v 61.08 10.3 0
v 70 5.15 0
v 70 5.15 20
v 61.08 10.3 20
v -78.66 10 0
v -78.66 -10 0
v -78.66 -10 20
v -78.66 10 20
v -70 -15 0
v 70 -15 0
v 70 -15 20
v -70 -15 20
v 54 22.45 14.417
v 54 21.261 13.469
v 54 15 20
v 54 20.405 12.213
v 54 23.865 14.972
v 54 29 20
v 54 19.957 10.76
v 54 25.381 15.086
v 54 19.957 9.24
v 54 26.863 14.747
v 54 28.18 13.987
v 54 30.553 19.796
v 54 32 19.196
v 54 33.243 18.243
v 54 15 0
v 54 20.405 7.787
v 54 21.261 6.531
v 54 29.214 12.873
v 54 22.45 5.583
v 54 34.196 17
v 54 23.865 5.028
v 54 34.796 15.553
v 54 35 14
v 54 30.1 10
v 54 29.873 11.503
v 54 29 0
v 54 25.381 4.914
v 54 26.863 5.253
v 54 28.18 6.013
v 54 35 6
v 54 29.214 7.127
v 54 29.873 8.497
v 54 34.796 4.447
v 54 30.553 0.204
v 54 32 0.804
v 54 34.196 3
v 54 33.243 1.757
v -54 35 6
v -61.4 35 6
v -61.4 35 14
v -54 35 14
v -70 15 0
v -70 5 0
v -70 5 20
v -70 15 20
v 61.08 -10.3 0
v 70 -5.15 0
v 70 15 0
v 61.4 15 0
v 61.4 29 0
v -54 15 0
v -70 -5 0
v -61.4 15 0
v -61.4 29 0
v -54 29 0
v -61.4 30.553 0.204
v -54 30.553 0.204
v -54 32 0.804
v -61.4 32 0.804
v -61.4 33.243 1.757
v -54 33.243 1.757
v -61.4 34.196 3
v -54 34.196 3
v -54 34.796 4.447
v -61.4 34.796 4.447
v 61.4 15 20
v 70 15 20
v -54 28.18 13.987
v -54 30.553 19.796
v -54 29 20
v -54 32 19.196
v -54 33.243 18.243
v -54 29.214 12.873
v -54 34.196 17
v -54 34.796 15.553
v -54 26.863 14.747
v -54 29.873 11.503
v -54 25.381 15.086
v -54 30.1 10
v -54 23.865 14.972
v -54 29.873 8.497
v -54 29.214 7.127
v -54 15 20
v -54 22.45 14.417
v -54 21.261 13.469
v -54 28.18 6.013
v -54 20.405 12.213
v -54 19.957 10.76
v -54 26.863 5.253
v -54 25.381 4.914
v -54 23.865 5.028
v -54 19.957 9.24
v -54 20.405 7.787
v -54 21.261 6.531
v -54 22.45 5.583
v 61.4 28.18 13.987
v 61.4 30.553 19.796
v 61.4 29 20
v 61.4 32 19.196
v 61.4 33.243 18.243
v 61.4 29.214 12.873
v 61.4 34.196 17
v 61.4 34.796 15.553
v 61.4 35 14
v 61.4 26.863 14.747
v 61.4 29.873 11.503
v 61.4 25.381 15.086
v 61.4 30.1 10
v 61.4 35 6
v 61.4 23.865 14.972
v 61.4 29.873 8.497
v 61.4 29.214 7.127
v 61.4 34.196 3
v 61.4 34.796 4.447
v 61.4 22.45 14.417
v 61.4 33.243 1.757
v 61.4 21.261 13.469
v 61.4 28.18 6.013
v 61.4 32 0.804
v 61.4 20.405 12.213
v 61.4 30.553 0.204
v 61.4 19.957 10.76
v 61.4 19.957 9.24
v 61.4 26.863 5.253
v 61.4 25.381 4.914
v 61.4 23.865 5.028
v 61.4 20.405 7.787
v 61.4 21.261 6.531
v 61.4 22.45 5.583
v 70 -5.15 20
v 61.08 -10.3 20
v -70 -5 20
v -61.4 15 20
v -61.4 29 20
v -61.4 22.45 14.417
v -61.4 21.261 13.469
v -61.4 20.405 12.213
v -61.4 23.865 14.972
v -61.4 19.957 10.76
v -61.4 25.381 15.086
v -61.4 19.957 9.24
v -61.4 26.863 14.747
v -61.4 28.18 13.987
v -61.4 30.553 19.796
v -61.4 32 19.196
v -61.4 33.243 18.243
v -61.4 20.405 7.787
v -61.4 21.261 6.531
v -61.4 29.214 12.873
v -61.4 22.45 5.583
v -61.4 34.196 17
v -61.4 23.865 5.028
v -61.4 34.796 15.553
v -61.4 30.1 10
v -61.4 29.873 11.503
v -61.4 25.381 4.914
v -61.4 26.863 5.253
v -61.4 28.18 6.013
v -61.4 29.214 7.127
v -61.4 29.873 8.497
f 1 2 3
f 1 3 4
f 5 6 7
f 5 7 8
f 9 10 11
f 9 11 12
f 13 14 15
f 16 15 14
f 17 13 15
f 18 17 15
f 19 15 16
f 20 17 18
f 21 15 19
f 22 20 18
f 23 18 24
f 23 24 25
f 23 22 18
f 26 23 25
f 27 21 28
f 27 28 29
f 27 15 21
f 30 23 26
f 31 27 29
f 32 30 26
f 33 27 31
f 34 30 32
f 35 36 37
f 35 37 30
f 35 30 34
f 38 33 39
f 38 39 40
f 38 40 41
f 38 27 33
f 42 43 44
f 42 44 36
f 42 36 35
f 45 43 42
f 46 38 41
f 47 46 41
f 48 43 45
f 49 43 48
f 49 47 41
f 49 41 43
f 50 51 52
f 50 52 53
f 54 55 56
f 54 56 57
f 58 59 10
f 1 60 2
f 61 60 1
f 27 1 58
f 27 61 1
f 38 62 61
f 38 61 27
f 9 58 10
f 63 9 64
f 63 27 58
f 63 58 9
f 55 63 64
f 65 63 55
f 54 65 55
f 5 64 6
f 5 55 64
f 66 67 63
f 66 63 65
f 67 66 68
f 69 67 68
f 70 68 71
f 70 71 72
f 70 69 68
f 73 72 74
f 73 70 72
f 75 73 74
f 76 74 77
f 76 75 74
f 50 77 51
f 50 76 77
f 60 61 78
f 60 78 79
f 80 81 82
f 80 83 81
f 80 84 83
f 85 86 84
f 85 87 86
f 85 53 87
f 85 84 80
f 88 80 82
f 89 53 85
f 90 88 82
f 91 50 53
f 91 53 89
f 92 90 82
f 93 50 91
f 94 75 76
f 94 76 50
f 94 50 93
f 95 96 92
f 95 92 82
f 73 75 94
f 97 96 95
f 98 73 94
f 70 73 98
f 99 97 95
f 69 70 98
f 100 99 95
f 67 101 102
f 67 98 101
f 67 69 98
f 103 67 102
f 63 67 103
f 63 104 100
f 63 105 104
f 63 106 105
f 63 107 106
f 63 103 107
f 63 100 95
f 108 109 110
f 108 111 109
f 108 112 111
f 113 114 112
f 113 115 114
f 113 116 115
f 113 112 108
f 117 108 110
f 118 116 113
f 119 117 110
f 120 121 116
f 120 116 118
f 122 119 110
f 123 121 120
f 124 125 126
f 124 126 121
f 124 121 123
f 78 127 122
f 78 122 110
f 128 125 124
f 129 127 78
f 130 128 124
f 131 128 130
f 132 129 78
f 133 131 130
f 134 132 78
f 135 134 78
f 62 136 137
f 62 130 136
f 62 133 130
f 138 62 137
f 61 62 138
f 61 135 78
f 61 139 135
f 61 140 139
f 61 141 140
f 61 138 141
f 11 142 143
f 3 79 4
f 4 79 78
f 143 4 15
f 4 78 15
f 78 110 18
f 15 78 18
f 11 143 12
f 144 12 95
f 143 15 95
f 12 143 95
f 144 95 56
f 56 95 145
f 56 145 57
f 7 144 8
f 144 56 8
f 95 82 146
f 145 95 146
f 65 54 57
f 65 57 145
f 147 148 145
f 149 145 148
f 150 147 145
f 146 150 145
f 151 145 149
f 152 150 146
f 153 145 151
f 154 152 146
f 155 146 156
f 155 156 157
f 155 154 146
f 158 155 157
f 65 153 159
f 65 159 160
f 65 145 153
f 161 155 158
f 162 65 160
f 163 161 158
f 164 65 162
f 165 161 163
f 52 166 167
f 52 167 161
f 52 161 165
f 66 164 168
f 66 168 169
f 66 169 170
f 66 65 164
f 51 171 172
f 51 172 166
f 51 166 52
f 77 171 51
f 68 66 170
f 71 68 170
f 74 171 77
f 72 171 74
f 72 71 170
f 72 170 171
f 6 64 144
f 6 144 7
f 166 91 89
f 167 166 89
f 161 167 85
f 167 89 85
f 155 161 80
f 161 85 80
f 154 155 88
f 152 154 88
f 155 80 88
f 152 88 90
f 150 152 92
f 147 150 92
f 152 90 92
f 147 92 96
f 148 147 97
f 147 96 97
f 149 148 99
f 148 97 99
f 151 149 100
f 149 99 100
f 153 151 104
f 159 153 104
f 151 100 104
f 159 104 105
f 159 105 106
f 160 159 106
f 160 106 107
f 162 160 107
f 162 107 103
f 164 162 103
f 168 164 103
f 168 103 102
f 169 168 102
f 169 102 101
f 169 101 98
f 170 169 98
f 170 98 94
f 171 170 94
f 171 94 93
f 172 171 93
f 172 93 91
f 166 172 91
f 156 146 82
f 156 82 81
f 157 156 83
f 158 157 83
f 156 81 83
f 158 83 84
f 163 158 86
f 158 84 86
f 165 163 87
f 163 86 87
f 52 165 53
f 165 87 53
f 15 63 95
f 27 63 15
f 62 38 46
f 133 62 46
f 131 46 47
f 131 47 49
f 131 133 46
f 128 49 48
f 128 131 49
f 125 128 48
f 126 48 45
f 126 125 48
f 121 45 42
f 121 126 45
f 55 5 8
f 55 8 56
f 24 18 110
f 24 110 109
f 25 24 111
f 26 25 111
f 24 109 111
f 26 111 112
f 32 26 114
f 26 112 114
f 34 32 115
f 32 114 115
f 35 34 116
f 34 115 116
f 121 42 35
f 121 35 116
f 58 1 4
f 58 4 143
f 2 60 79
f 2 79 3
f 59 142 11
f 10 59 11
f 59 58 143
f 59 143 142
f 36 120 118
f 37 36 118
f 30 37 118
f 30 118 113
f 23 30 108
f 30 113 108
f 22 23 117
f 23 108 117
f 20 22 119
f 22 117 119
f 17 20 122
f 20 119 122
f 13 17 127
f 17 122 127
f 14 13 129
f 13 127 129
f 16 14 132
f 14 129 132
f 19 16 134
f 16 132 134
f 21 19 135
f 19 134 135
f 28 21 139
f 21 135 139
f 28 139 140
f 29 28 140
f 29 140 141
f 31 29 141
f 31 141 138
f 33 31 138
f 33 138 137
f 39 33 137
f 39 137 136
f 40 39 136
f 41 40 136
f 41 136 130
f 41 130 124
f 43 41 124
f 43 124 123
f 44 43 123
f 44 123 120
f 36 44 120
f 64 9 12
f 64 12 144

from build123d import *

# Parameters (mm, degrees)
PAD001_DEPTH = 20
SKETCH002_R  = 5.1
POCKET_DEPTH = 200
FILLET_R     = 6


with BuildPart() as part:
    # Sketch001 → Pad001 (new body)
    with BuildSketch(Plane.XY):
        Polygon((-70, 15), (-61.4, 15), (-61.4, 35), (-54, 35), (-54, 15), (54, 15), (54, 35), (61.4, 35), (61.4, 15), (70, 15), (70, 5.15), (61.079938, 10.3), (61.079938, -10.3), (70, -5.15), (70, -15), (-70, -15), (-70, -5), (-78.660254, -10), (-78.660254, 10), (-70, 5), align=None)
    extrude(amount=PAD001_DEPTH)

    # Sketch002 (on Face9 of Pad001) → Pocket (cut)
    with BuildSketch(Plane.YZ.offset(61.4)):
        with Locations((25, 10)):
            Circle(SKETCH002_R)
    extrude(amount=-POCKET_DEPTH, mode=Mode.SUBTRACT)

    # Fillet
    fillet_edges = [part.edges().sort_by_distance(p)[0] for p in [
        (57.7, 35, 20),
        (57.7, 35, 0),
        (-57.7, 35, 0),
        (-57.7, 35, 20),
    ]]
    fillet(fillet_edges, radius=FILLET_R)


solid = part.part
